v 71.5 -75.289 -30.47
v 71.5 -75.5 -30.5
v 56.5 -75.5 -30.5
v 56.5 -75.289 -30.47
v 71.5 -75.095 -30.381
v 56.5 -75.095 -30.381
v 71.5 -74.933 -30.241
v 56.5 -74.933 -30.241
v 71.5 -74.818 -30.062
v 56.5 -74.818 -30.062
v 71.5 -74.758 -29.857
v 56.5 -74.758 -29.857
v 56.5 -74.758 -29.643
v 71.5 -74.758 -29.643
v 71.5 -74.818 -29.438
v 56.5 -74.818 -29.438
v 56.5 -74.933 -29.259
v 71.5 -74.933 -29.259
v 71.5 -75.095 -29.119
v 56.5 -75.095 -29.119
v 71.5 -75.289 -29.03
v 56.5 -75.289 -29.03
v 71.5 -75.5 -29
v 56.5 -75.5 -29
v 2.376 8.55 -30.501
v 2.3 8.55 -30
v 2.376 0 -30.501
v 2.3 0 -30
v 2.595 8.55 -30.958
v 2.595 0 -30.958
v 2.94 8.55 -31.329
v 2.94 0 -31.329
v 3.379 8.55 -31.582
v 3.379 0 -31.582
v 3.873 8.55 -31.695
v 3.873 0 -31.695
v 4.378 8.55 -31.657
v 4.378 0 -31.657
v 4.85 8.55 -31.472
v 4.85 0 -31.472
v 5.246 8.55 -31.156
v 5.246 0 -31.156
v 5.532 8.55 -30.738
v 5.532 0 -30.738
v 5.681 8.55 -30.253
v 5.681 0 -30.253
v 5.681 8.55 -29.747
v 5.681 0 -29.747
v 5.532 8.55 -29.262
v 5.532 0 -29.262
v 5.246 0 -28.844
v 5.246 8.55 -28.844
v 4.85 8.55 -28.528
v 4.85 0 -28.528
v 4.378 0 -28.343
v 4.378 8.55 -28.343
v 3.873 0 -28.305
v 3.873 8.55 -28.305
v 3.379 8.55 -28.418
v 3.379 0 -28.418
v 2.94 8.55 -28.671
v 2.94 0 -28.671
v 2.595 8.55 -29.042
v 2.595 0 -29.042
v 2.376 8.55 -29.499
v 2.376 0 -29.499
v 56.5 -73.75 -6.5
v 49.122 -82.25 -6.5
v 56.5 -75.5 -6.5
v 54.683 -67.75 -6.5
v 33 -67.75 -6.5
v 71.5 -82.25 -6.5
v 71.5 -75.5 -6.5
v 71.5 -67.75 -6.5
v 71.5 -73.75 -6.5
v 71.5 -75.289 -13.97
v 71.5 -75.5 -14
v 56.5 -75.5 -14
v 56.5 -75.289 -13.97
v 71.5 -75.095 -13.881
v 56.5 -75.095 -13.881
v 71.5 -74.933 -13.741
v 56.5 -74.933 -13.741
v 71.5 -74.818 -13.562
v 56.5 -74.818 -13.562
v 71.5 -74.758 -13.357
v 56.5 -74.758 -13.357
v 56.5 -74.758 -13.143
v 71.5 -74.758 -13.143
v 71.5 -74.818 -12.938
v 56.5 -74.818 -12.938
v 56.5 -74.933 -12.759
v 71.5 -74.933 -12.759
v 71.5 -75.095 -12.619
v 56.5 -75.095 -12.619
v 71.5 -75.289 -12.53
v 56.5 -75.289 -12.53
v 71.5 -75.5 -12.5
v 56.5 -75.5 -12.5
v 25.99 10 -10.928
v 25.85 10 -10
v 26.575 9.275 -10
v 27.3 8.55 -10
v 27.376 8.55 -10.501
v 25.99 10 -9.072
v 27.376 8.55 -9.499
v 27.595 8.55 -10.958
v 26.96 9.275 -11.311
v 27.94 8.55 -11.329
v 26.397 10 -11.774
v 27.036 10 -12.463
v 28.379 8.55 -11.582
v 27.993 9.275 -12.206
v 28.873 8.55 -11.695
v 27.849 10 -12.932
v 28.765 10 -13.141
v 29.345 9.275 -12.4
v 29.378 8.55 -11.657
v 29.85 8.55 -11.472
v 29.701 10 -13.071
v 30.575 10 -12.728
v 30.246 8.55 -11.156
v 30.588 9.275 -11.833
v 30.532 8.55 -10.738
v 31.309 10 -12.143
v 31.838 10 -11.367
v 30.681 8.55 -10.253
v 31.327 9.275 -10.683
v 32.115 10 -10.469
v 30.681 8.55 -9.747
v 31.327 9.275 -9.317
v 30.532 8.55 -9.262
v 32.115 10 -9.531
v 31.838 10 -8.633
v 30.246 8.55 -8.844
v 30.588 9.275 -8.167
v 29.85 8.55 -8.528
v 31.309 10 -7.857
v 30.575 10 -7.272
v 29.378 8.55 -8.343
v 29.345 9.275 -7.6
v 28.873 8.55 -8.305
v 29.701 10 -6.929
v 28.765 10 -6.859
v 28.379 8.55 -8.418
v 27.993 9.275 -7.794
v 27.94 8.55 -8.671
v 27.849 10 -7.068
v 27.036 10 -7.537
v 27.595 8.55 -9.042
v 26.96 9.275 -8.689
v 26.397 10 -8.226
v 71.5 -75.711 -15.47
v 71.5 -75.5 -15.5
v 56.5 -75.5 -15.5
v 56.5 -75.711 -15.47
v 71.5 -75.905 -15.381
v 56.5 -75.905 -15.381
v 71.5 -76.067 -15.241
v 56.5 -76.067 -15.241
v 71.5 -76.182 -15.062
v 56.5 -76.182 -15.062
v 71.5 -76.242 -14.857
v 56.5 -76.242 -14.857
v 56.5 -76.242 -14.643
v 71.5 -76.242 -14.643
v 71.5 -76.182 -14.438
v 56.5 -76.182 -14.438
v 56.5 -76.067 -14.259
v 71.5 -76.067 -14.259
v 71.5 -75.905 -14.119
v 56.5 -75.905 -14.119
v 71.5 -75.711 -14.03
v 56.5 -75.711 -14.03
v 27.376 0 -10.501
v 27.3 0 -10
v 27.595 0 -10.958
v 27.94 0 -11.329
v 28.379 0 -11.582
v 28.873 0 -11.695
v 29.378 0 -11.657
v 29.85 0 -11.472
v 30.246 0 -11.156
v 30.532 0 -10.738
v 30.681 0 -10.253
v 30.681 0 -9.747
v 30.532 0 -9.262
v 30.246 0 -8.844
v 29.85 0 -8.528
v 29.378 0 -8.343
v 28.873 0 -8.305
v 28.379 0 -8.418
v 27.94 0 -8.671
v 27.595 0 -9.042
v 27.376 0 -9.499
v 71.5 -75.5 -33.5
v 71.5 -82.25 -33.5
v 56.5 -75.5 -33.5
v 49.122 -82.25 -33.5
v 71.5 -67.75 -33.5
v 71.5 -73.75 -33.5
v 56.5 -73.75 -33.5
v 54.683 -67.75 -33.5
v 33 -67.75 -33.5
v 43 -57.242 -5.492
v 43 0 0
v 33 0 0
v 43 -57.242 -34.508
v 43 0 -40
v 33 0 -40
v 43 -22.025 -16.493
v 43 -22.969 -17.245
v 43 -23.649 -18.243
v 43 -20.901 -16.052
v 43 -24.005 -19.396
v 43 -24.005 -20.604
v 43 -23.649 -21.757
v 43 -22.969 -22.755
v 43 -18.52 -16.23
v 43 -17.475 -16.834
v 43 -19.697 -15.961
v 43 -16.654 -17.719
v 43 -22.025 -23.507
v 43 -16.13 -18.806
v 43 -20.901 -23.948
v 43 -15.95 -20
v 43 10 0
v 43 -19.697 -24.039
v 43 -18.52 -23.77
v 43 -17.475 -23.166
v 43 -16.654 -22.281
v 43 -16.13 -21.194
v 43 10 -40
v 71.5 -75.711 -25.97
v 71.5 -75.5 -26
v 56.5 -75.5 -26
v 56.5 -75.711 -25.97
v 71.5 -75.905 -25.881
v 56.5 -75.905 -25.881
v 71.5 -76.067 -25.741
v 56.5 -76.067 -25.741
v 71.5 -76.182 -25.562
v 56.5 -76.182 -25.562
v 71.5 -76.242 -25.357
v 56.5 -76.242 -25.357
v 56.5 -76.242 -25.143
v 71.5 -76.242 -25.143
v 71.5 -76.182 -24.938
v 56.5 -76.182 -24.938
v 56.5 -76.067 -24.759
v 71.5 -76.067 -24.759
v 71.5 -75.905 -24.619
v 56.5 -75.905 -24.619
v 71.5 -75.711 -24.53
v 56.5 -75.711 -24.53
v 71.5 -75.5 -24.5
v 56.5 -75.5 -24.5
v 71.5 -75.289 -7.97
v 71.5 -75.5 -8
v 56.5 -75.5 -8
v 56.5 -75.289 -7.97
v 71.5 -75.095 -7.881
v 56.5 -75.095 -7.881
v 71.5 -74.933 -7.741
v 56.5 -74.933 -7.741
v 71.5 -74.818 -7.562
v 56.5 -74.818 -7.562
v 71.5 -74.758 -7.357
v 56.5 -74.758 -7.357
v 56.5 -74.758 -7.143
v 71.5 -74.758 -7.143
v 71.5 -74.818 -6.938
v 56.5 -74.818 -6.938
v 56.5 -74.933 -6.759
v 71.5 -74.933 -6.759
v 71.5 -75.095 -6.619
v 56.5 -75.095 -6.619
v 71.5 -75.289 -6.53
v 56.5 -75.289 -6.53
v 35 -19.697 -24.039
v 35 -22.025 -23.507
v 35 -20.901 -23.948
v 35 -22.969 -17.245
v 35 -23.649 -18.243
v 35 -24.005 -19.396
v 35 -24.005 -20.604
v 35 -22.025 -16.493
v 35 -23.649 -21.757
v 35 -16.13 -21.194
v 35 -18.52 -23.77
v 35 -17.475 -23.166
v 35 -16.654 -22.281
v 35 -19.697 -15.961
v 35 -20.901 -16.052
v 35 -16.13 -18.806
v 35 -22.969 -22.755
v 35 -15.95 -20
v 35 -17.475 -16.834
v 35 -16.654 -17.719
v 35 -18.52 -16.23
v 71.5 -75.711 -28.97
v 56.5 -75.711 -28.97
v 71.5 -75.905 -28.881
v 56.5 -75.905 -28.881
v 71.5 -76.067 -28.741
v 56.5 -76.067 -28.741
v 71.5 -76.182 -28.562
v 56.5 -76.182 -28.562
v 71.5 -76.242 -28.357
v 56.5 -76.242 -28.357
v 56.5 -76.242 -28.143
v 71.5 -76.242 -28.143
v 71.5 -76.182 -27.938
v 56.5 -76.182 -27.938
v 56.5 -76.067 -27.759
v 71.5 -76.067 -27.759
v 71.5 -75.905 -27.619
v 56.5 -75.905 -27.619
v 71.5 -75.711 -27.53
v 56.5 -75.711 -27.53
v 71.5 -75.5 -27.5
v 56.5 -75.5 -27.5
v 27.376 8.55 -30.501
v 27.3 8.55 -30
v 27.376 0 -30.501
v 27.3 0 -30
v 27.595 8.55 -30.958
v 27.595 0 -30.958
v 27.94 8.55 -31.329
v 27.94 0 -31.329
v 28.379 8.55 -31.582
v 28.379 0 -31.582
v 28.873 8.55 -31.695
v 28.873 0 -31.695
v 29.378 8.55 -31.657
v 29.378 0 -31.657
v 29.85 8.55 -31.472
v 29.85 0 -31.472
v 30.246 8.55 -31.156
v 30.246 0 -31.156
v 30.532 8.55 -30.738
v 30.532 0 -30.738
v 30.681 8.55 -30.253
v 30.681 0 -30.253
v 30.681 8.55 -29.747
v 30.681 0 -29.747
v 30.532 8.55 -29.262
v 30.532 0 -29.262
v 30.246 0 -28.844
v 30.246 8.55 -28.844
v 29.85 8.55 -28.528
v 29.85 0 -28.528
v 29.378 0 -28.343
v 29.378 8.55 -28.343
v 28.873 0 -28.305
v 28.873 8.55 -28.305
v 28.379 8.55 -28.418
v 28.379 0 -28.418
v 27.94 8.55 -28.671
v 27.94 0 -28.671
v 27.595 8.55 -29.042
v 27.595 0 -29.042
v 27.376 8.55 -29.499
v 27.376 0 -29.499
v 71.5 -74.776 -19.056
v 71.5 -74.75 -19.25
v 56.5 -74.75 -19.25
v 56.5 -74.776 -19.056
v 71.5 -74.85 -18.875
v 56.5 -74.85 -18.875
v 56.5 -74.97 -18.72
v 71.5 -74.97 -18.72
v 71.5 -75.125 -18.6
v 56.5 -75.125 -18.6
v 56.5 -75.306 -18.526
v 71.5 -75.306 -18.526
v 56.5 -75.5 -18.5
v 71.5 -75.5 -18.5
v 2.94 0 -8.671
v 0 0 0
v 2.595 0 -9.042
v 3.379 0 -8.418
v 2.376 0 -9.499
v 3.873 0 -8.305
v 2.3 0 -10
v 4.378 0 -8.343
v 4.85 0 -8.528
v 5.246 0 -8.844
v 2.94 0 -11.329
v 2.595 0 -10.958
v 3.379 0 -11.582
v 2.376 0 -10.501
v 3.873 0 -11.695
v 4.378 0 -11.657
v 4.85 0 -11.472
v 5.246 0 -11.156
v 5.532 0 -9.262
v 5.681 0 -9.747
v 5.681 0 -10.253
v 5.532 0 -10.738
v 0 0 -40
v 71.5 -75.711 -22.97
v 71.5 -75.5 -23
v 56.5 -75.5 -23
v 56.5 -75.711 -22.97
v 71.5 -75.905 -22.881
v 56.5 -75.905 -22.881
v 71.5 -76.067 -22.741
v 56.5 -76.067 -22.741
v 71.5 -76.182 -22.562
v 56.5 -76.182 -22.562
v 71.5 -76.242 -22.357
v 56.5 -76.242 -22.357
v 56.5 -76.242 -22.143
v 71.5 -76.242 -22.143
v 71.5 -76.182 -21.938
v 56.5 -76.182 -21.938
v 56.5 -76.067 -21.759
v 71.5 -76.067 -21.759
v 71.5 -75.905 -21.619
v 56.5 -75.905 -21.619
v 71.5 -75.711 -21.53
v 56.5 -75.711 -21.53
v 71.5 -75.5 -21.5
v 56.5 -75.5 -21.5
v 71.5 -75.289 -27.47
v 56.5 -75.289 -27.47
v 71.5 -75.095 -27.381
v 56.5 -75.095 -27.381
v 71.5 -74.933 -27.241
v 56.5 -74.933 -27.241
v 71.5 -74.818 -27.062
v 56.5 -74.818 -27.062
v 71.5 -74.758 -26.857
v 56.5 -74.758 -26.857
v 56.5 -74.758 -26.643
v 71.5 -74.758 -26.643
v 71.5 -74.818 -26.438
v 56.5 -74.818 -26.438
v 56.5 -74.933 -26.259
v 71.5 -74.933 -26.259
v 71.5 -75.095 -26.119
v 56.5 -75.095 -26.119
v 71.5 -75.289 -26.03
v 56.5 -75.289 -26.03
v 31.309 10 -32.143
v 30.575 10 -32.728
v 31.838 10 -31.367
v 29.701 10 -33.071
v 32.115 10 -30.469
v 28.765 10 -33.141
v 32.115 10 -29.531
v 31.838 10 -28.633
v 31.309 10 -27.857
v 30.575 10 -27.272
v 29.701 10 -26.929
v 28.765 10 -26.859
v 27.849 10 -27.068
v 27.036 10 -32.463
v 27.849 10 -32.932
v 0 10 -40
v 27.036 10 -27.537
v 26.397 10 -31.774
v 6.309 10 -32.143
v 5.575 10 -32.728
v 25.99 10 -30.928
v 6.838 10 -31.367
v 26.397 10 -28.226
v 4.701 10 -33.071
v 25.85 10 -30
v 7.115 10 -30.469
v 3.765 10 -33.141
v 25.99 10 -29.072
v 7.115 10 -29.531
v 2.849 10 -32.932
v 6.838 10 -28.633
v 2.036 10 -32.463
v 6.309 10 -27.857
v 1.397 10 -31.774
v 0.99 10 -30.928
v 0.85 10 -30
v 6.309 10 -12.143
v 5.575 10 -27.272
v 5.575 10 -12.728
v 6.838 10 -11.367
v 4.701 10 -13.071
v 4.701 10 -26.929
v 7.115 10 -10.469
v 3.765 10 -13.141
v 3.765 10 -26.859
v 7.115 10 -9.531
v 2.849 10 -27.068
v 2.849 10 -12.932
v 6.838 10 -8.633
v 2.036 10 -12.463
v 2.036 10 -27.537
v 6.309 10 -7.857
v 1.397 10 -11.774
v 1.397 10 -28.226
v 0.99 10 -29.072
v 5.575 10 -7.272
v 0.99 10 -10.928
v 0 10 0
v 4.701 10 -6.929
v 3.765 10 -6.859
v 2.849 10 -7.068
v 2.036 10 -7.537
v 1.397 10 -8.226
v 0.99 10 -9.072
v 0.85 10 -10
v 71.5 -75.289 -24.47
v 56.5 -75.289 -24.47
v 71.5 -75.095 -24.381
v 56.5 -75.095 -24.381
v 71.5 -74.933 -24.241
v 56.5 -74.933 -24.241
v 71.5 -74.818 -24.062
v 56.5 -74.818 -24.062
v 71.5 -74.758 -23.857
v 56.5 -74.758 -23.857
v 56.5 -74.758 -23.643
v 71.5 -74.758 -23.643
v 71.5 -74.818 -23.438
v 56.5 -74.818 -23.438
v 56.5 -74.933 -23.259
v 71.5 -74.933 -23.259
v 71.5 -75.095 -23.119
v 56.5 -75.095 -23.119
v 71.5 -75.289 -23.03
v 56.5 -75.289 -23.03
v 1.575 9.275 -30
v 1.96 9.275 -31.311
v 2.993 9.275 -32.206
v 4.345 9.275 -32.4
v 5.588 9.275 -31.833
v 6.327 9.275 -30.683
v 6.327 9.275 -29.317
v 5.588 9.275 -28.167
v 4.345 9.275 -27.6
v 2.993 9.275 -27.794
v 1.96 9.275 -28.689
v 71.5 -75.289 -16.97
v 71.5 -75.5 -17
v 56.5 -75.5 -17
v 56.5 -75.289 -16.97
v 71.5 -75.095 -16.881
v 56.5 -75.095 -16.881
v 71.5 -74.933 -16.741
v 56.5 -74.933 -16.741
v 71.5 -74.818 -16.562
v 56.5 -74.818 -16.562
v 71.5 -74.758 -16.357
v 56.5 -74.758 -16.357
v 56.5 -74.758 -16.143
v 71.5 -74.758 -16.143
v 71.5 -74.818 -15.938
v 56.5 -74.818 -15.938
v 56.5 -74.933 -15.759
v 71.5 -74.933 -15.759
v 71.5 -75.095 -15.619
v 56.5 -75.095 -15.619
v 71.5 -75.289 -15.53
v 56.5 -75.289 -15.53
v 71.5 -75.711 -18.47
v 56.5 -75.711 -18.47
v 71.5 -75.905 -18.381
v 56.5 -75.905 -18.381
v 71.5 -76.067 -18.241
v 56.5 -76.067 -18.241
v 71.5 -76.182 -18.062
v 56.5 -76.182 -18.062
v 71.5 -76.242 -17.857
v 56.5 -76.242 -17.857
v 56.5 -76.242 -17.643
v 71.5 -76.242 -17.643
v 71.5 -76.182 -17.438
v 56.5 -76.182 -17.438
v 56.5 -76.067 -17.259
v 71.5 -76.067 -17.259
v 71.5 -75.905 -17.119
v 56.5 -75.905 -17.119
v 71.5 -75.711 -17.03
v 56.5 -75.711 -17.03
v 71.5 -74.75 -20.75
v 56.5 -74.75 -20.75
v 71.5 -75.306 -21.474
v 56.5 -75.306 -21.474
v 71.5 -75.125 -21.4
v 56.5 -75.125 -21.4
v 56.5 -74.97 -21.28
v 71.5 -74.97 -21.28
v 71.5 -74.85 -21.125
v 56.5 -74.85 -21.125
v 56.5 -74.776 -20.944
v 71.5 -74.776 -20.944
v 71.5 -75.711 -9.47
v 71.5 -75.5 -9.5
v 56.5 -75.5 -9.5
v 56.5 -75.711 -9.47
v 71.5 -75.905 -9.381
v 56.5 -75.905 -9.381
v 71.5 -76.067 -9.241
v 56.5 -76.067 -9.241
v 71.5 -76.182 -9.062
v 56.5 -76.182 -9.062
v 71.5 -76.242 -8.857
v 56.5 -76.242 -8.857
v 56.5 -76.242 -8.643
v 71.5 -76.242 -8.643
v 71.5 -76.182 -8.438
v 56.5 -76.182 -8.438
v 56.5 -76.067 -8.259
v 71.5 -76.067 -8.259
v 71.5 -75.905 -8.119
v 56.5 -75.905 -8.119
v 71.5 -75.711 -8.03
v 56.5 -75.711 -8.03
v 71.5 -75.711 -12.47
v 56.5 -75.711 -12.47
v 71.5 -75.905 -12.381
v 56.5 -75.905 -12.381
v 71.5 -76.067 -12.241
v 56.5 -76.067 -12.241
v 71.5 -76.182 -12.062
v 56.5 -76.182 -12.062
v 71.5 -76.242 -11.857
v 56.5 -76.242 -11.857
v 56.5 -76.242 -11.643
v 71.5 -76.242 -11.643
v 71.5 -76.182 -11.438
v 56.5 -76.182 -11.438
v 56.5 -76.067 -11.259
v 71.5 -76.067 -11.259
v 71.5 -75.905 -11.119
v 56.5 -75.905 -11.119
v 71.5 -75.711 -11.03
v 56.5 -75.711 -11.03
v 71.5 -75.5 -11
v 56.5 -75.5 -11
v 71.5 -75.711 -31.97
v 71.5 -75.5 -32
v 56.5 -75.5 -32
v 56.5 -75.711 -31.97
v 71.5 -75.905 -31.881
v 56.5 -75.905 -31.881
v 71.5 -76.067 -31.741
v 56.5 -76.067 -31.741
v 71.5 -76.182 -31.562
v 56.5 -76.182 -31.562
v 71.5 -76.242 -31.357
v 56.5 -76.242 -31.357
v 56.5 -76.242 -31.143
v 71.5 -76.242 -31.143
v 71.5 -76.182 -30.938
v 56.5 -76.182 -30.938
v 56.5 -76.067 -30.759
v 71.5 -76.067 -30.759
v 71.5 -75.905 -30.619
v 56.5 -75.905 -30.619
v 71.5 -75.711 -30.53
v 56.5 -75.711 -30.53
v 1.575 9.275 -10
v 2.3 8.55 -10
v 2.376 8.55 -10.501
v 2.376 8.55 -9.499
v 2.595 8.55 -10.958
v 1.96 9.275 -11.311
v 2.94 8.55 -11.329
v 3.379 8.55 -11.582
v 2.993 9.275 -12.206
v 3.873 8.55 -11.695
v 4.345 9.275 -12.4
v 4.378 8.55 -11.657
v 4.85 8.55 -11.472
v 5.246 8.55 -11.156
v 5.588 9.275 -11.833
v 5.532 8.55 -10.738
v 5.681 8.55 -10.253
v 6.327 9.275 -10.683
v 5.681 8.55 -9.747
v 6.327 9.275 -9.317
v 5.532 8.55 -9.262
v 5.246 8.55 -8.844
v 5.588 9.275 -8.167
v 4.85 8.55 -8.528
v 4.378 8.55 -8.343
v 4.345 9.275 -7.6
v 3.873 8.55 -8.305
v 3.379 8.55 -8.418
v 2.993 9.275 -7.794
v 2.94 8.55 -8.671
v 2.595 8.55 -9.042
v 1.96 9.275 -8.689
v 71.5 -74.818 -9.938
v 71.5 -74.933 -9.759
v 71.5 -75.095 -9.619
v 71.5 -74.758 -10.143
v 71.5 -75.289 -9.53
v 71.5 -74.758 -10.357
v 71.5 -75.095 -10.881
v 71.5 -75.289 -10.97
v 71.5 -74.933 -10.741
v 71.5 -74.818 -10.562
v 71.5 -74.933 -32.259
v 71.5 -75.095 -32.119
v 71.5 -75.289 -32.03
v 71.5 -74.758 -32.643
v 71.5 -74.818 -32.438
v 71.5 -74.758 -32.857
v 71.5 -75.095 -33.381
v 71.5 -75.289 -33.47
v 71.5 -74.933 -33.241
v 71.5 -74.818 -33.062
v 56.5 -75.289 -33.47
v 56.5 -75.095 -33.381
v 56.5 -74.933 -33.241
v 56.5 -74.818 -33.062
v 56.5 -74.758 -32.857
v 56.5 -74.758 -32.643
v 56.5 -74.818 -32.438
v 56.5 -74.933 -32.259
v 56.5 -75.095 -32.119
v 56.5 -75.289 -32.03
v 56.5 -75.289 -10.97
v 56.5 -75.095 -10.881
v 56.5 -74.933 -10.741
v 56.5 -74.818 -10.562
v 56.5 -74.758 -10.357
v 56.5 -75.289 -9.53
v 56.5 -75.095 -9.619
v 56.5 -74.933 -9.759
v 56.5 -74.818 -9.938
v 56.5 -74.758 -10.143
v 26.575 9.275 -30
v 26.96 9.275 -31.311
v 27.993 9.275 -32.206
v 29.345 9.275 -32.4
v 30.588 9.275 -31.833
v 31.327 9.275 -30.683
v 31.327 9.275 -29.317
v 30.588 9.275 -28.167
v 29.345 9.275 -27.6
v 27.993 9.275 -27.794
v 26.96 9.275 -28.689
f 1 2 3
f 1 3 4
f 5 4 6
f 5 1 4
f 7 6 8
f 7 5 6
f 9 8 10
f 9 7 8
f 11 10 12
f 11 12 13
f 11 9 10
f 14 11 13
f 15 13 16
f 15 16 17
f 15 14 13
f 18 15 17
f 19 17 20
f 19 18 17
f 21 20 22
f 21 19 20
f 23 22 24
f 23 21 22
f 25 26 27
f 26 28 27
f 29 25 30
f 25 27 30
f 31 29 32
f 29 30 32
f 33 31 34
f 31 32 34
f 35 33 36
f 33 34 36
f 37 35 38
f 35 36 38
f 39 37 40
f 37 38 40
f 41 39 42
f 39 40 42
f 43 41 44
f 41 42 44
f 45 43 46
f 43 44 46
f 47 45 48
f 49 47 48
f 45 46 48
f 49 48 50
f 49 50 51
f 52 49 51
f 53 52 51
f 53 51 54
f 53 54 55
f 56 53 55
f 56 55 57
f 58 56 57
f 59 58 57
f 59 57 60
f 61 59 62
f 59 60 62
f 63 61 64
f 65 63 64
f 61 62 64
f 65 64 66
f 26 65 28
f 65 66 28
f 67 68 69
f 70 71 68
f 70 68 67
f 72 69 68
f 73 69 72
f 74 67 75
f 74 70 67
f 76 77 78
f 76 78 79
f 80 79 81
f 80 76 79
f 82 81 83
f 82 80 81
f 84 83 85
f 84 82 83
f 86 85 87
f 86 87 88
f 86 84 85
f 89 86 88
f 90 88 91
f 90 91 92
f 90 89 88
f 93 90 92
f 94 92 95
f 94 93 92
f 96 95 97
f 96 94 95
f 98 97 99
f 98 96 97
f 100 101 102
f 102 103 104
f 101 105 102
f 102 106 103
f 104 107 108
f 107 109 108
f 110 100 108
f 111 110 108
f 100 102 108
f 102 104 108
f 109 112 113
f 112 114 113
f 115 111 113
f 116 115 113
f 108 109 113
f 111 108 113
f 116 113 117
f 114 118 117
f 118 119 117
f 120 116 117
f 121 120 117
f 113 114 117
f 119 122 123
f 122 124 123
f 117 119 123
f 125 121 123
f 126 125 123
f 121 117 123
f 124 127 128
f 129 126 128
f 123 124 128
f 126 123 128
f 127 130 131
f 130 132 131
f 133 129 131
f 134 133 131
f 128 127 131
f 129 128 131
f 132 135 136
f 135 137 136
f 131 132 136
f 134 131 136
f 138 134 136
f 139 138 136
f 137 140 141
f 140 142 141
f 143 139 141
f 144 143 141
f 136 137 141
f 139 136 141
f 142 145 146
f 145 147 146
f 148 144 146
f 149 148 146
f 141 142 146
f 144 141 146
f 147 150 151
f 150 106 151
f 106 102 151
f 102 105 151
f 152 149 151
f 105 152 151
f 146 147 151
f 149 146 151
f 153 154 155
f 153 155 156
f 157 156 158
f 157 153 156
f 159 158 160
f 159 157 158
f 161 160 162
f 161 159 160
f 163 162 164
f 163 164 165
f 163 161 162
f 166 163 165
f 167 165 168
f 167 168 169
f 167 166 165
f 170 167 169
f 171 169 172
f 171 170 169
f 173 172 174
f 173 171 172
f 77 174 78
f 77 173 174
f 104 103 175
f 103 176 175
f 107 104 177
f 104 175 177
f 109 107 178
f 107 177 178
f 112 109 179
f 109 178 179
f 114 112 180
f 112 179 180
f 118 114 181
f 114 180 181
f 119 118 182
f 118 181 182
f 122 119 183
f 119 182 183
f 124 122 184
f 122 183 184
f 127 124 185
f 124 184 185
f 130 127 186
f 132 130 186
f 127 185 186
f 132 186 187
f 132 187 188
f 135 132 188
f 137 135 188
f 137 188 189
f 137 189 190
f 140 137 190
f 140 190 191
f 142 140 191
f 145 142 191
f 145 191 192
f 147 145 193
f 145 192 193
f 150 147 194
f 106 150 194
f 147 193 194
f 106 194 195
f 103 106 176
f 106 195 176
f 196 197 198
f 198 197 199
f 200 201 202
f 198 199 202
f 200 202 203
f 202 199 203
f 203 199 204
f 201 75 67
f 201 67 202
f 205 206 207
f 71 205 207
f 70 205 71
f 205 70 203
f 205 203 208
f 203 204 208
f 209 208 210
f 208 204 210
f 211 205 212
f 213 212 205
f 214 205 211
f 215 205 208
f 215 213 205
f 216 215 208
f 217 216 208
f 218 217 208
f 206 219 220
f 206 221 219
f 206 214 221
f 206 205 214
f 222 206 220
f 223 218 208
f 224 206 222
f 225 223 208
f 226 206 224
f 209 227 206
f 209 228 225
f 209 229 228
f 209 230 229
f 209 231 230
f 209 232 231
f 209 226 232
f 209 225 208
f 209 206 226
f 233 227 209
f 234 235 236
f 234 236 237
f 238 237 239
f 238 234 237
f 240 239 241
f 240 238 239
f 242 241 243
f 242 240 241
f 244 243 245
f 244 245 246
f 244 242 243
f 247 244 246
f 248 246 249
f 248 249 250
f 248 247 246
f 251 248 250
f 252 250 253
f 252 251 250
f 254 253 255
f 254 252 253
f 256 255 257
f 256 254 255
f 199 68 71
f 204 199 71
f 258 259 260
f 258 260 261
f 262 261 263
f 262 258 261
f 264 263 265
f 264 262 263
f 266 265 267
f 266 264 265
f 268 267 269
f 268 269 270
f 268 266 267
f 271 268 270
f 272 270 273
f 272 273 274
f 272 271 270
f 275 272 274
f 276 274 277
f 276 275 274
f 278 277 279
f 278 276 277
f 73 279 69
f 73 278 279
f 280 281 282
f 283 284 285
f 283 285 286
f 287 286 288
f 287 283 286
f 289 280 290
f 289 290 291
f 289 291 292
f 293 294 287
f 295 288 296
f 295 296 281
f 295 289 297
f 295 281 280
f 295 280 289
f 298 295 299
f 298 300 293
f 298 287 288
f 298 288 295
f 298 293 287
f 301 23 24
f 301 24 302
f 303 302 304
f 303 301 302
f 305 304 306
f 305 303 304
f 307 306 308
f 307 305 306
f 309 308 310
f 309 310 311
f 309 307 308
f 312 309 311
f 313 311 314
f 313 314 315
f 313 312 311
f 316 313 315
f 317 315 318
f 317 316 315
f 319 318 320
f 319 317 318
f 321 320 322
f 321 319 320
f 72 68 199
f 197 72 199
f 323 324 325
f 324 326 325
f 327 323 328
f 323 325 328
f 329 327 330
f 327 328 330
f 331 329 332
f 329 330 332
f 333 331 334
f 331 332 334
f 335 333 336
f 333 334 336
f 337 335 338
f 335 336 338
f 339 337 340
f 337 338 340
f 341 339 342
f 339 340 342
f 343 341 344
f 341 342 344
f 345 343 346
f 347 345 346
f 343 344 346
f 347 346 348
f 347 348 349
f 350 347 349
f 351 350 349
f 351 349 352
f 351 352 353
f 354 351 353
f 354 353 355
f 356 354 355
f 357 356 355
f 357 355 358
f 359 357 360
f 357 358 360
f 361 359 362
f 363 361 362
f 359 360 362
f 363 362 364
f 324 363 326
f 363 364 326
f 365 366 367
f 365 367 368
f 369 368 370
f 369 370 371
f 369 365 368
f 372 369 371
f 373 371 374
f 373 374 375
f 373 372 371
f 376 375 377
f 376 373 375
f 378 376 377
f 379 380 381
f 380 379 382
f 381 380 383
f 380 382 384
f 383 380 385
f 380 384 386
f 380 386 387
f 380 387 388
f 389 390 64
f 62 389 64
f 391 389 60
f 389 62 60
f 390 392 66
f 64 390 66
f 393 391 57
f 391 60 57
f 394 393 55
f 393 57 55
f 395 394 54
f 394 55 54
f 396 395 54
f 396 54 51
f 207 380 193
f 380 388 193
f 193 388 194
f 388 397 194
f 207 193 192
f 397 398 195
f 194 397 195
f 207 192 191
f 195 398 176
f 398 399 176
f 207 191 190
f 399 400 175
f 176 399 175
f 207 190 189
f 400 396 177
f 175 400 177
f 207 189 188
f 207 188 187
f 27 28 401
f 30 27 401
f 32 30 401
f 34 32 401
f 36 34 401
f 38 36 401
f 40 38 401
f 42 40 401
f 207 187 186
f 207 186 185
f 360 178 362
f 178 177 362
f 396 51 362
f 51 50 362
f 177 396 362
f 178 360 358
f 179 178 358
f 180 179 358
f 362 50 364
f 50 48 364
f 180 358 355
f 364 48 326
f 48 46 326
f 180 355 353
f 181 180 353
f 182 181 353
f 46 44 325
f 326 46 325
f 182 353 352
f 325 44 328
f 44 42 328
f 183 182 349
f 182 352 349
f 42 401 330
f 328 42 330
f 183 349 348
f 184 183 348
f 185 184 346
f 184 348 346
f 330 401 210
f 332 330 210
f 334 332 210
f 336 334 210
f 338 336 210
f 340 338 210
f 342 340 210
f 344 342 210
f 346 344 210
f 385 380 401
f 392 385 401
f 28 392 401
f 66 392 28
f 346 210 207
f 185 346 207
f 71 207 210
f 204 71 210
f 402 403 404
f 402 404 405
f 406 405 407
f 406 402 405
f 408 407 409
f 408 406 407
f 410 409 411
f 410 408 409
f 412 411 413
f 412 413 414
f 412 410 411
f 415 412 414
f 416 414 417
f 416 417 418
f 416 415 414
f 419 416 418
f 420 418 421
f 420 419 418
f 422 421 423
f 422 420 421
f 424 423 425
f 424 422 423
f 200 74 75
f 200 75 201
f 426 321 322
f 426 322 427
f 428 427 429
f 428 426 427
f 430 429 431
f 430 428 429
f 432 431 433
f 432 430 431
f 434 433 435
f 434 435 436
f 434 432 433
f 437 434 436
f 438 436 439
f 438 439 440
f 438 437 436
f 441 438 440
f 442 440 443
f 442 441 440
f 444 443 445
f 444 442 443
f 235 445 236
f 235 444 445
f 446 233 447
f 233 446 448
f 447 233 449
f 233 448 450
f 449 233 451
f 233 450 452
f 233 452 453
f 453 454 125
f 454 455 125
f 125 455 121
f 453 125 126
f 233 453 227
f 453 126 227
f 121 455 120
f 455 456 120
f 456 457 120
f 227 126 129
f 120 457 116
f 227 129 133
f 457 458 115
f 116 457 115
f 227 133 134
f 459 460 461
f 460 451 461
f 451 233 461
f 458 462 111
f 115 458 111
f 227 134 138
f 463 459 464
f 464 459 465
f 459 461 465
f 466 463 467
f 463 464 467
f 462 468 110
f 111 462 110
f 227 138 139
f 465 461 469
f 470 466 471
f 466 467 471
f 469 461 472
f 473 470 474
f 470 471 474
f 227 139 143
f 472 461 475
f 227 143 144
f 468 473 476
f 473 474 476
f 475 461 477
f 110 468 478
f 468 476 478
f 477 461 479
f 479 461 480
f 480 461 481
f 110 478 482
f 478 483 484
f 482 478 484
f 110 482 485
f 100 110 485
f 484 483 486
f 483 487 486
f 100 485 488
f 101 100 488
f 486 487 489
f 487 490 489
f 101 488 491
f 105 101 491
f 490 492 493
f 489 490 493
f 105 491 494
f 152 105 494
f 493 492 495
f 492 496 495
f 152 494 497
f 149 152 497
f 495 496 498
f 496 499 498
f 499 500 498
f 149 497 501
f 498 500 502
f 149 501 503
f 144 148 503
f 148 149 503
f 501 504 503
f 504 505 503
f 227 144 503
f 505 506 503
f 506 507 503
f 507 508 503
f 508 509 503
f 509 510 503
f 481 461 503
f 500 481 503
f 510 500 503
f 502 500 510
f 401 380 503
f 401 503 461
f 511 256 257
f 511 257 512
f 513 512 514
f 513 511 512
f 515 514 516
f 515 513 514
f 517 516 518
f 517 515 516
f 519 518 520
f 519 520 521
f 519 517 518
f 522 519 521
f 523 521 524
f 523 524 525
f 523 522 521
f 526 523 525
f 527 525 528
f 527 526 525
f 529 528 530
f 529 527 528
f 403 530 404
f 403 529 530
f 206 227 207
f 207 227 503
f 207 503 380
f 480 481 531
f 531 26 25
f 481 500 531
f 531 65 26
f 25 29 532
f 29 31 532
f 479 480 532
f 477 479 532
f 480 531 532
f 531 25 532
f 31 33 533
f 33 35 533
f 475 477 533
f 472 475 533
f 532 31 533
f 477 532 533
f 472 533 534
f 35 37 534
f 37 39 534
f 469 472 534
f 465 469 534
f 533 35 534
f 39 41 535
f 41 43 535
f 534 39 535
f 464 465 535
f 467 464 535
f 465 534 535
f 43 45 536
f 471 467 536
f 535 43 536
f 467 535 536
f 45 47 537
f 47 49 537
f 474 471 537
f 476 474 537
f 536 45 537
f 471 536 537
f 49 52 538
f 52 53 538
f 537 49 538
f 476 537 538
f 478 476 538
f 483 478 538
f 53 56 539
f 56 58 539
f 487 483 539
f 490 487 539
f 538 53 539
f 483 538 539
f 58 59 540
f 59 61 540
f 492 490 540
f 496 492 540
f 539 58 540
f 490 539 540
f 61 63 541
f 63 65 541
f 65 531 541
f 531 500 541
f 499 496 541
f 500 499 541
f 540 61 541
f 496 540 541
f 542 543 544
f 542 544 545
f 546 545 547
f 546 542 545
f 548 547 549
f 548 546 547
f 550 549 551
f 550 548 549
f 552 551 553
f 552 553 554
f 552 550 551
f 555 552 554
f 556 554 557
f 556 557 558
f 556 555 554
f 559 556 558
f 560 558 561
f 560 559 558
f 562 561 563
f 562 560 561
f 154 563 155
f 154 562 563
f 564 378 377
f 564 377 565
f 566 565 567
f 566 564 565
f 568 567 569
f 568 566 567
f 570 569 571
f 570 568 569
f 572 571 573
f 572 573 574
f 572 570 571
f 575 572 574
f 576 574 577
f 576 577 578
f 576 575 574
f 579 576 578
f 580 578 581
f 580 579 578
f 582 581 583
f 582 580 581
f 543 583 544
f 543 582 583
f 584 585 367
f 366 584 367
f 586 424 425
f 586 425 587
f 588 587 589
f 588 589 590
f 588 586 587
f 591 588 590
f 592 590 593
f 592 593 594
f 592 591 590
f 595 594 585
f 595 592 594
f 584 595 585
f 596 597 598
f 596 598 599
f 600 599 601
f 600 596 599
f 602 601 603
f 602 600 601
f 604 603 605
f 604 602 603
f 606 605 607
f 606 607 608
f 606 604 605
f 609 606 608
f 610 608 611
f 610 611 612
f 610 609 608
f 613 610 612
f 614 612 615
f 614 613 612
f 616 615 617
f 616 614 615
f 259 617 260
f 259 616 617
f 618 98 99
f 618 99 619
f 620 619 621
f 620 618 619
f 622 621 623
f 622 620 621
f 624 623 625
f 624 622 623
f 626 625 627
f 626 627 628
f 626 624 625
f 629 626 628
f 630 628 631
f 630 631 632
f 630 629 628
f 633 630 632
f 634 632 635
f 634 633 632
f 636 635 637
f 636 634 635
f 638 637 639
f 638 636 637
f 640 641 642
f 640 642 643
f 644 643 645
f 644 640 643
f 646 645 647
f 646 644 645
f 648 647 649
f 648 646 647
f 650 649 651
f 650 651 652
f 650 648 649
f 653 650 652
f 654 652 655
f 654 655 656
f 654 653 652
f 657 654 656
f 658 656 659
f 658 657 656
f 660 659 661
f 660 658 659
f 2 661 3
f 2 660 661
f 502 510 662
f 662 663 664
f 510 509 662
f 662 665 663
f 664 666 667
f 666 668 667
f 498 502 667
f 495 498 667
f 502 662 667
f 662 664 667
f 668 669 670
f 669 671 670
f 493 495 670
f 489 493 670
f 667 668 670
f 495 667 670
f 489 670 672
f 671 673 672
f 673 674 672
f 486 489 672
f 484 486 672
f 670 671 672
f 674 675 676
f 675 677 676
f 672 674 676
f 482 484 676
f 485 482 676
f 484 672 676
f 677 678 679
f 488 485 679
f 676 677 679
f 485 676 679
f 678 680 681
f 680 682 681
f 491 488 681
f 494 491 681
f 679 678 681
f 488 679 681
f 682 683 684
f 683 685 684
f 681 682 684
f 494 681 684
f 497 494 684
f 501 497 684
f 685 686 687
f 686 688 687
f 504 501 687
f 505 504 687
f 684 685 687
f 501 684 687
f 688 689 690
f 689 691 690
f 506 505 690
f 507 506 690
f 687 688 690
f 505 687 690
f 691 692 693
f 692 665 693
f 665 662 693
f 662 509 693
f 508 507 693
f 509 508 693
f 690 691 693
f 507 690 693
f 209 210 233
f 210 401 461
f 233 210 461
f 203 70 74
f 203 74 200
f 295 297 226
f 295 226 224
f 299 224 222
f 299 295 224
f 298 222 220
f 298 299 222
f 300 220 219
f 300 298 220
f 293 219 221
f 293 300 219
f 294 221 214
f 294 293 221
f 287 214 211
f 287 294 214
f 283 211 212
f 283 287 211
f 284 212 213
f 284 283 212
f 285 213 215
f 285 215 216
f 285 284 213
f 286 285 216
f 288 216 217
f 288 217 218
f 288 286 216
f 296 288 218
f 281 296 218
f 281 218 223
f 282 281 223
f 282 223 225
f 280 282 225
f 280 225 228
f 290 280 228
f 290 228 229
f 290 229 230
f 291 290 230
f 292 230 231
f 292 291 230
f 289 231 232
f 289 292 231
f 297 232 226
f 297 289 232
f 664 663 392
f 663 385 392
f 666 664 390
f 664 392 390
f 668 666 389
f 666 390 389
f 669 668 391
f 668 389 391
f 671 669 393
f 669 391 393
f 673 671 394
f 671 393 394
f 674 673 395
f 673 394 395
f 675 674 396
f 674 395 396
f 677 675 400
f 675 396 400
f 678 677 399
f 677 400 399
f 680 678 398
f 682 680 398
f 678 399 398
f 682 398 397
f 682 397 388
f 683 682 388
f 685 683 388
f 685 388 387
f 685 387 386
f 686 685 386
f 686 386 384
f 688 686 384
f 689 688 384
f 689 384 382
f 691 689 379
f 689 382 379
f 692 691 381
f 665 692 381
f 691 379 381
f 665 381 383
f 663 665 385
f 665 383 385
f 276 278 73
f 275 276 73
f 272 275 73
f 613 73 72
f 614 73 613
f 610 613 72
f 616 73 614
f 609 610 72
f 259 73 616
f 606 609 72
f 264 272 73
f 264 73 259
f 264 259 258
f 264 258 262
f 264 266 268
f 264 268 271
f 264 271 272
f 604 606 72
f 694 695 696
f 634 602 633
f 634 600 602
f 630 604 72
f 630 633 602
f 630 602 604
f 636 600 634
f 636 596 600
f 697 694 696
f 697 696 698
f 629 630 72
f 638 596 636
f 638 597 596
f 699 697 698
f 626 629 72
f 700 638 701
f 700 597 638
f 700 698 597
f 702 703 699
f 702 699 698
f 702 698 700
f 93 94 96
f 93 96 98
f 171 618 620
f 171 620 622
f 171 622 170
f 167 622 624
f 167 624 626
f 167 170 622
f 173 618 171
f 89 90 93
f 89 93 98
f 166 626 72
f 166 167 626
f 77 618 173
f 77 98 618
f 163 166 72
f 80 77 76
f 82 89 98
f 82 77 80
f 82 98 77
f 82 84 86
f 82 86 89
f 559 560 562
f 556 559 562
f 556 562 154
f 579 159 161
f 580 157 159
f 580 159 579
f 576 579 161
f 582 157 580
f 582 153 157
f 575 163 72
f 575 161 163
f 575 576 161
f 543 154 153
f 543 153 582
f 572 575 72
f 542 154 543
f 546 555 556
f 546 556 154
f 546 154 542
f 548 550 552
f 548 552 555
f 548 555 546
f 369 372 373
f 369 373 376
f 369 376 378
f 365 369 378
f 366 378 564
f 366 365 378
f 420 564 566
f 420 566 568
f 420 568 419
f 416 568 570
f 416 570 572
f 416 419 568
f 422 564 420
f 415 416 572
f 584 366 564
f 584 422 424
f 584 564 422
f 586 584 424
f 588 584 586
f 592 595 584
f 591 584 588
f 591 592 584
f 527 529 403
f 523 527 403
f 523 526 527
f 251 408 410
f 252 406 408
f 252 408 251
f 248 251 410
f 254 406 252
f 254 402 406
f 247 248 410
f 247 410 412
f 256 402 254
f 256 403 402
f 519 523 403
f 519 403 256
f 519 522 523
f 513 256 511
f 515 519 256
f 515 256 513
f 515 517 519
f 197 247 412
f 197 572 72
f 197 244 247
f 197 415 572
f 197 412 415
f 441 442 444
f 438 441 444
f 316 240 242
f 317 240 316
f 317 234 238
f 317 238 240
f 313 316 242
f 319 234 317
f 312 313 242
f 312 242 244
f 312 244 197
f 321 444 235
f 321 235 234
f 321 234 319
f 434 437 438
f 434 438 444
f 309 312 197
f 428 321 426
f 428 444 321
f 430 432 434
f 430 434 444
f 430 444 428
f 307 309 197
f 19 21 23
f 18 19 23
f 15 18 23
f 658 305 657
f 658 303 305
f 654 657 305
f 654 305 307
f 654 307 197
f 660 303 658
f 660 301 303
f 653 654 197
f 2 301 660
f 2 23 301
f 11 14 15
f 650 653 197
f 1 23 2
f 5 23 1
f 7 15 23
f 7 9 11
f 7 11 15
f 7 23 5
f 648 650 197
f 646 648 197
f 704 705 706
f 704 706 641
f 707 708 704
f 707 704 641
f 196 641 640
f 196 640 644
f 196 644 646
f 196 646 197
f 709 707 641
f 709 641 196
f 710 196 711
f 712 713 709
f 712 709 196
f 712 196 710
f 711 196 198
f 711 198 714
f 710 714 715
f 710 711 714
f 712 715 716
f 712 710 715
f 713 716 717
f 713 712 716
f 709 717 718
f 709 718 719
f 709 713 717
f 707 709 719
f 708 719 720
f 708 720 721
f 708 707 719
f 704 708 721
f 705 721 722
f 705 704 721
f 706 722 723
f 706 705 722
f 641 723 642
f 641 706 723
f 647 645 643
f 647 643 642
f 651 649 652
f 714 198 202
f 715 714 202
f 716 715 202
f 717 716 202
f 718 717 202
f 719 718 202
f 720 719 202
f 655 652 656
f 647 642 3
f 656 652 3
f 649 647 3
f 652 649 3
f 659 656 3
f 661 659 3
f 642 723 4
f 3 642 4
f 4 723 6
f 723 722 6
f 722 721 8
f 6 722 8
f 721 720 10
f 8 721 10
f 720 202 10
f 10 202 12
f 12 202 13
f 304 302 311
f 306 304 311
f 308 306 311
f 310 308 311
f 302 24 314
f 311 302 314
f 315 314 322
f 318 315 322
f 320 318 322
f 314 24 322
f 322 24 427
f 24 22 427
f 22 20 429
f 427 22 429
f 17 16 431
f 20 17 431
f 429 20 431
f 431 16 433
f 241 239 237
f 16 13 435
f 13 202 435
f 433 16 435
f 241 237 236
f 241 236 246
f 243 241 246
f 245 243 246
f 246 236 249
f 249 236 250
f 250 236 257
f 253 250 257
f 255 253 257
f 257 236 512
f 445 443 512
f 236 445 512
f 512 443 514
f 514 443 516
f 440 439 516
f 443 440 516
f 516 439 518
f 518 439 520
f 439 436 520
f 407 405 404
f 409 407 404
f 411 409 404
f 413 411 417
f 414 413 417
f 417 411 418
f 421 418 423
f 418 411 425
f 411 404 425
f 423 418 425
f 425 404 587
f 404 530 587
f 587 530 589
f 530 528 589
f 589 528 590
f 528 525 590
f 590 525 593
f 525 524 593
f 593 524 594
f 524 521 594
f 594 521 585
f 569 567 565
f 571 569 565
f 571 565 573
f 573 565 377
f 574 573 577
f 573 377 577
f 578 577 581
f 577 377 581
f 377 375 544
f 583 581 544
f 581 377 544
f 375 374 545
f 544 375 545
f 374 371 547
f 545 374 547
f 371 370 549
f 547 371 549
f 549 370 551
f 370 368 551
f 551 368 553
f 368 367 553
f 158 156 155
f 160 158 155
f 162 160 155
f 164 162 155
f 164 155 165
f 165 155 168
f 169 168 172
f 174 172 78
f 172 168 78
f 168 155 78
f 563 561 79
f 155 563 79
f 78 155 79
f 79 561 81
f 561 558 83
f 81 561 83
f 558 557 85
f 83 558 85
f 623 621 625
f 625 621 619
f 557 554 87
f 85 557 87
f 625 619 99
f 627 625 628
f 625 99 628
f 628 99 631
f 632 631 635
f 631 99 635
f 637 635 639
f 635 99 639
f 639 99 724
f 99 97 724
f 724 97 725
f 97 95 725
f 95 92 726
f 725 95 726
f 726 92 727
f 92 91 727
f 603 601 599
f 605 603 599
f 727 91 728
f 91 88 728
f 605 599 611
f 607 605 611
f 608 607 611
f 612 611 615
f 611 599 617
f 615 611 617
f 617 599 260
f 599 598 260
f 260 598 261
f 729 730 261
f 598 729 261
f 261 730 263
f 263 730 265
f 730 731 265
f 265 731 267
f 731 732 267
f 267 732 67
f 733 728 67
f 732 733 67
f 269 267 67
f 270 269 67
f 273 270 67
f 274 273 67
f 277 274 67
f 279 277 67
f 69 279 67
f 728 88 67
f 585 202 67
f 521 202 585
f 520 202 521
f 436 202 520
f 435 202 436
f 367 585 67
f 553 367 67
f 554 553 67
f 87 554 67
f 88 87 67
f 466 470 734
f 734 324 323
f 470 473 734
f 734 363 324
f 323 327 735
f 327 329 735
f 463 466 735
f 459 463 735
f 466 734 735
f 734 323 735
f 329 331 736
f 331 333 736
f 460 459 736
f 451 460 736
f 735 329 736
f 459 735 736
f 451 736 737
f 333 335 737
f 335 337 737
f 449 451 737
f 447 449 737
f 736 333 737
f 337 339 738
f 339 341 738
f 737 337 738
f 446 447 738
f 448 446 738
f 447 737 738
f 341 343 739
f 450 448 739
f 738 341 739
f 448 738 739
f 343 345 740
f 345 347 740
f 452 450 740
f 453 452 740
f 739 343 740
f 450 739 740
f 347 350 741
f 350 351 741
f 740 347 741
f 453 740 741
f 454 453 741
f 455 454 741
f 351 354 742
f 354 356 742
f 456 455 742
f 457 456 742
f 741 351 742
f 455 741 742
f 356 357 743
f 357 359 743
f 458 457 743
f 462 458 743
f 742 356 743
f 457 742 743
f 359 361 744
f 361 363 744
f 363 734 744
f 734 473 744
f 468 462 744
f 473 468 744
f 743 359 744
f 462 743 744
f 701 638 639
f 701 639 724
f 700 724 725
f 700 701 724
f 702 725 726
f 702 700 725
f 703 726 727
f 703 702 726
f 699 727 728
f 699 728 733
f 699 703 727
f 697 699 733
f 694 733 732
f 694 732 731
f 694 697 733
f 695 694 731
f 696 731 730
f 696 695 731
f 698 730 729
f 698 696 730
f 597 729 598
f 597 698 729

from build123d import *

# Parameters (mm, degrees)
SKETCH_1_W                   = 33
SKETCH_1_H                   = 40
EXTRUDE_1_DEPTH              = 10
EXTRUDE_2_DEPTH              = 10
SKETCH_3_W                   = 27
SKETCH_3_H                   = 14.5
EXTRUDE_3_DEPTH              = 28.5
CUT_EXTRUDE_1_DEPTH          = 15
CUT_EXTRUDE_2_REACH          = 116.016
EXTRUDE_4_REACH              = 116.016
EXTRUDE_5_REACH              = 116.016
HOLE_WIZARD_M3_1_D           = 3.4
HOLE_WIZARD_M3_1_CSINK_D     = 6.3
HOLE_WIZARD_M3_1_CSINK_ANGLE = 90
OTHER_START                  = 35
OTHER_1_OUTLINE_R            = 4.05
OTHER_1_DEPTH                = 8


# Read off the part's stored shape, not the designer's step: 高级异型孔1
with BuildPart() as part:
    # 草图1 → 凸台-拉伸1 (new body)
    with BuildSketch(Plane(origin=(0, 0, 0), x_dir=(1, 0, 0), z_dir=(0, 1, 0))):
        with Locations((16.5, 20)):
            Rectangle(SKETCH_1_W, SKETCH_1_H)
    extrude(amount=EXTRUDE_1_DEPTH)

    # 草图2 → 凸台-拉伸2 (add)
    with BuildSketch(Plane(origin=(33, 0, 0), x_dir=(0, 0, -1), z_dir=(1, 0, 0))):
        Polygon((0, 0), (6.5, -67.75), (6.5, -82.25), (33.5, -82.25), (33.5, -67.75), (40, 0), (40, 10), (0, 10), align=None)
    extrude(amount=EXTRUDE_2_DEPTH)

    # 草图3 → 凸台-拉伸3 (add)
    with BuildSketch(Plane(origin=(43, 0, 0), x_dir=(0, 0, -1), z_dir=(1, 0, 0))):
        with Locations((20, -75)):
            Rectangle(SKETCH_3_W, SKETCH_3_H)
    extrude(amount=EXTRUDE_3_DEPTH)

    # 草图4 → 切除-拉伸1 (cut)
    with BuildSketch(Plane.ZY.offset(-71.5)):
        with BuildLine():
            Line((-6.5, -75.5), (-6.5, -73.75))
            Line((-6.5, -73.75), (-33.5, -73.75))
            Line((-33.5, -73.75), (-33.5, -75.5))
            ThreePointArc((-33.5, -75.5), (-32.75, -74.75), (-32, -75.5))
            ThreePointArc((-32, -75.5), (-31.25, -76.25), (-30.5, -75.5))
            ThreePointArc((-30.5, -75.5), (-29.75, -74.75), (-29, -75.5))
            ThreePointArc((-29, -75.5), (-28.25, -76.25), (-27.5, -75.5))
            ThreePointArc((-27.5, -75.5), (-26.75, -74.75), (-26, -75.5))
            ThreePointArc((-26, -75.5), (-25.25, -76.25), (-24.5, -75.5))
            ThreePointArc((-24.5, -75.5), (-23.75, -74.75), (-23, -75.5))
            ThreePointArc((-23, -75.5), (-22.25, -76.25), (-21.5, -75.5))
            ThreePointArc((-21.5, -75.5), (-21.280330086, -74.969669914), (-20.75, -74.75))
            Line((-20.75, -74.75), (-19.25, -74.75))
            ThreePointArc((-19.25, -74.75), (-18.719669914, -74.969669914), (-18.5, -75.5))
            ThreePointArc((-18.5, -75.5), (-17.75, -76.25), (-17, -75.5))
            ThreePointArc((-17, -75.5), (-16.25, -74.75), (-15.5, -75.5))
            ThreePointArc((-15.5, -75.5), (-14.75, -76.25), (-14, -75.5))
            ThreePointArc((-14, -75.5), (-13.25, -74.75), (-12.5, -75.5))
            ThreePointArc((-12.5, -75.5), (-11.75, -76.25), (-11, -75.5))
            ThreePointArc((-11, -75.5), (-10.25, -74.75), (-9.5, -75.5))
            ThreePointArc((-9.5, -75.5), (-8.75, -76.25), (-8, -75.5))
            ThreePointArc((-8, -75.5), (-7.25, -74.75), (-6.5, -75.5))
        make_face()
    extrude(amount=CUT_EXTRUDE_1_DEPTH, mode=Mode.SUBTRACT)

    # 草图5 → 切除-拉伸2 (cut, up to next)
    with BuildSketch(Plane.XY.offset(-6.5), mode=Mode.PRIVATE) as cut_extrude_2_sk1:
        Polygon((33, -82.25), (49.121822718, -82.25), (33, -67.75), align=None)
    cut_extrude_2_tool1 = extrude(cut_extrude_2_sk1.sketch, amount=-CUT_EXTRUDE_2_REACH, mode=Mode.PRIVATE) & part.part
    add(cut_extrude_2_tool1.solids().sort_by_distance((38.373941, -77.416667, -6.5))[0], mode=Mode.SUBTRACT)

    # 凸台-拉伸4: up to this plane
    extrude_4_end = Plane(origin=(43, -67.75, -33.5), z_dir=(0, 0.09550243214662471, 0.9954291966052028))
    # 草图6 → 凸台-拉伸4 (add, up to the surface)
    with BuildSketch(Plane.XY.offset(-6.5), mode=Mode.PRIVATE) as extrude_4_sk1:
        Polygon((43, -57.242064668), (43, -67.75), (54.683246246, -67.75), align=None)
    extrude_4_tool1 = split(extrude(extrude_4_sk1.sketch, amount=-EXTRUDE_4_REACH, mode=Mode.PRIVATE), bisect_by=extrude_4_end, keep=Keep.BOTH, mode=Mode.PRIVATE)
    add(extrude_4_tool1.solids().sort_by_distance((46.894415, -64.247355, -6.5))[0])

    # 凸台-拉伸5: up to this face of the body (flat: up to its plane)
    extrude_5_end = Plane(part.part.faces().sort_by_distance((38, -33.875, -3.25))[0])
    # 草图6<2> → 凸台-拉伸5 (add, up to the picked face)
    with BuildSketch(Plane.XY.offset(-6.5), mode=Mode.PRIVATE) as extrude_5_sk1:
        Polygon((43, -57.242064668), (43, -67.75), (54.683246246, -67.75), align=None)
    extrude_5_tool1 = split(extrude(extrude_5_sk1.sketch, amount=EXTRUDE_5_REACH, mode=Mode.PRIVATE), bisect_by=extrude_5_end, keep=Keep.BOTH, mode=Mode.PRIVATE)
    add(extrude_5_tool1.solids().sort_by(Axis((46.894415, -64.247355, -6.5), (0, 0, 1)))[0])

    # M3 平头机械螺钉的锥形沉头孔1 (through all)
    with Locations(Plane(origin=(0, 10, 0), x_dir=(1, 0, 0), z_dir=(0, 1, 0))):
        with Locations((29, 30), (4, 30), (4, 10), (29, 10)):
            CounterSinkHole(HOLE_WIZARD_M3_1_D / 2, HOLE_WIZARD_M3_1_CSINK_D / 2, counter_sink_angle=HOLE_WIZARD_M3_1_CSINK_ANGLE)

    # 高级异型孔1 outline → 高级异型孔1 (cut)
    with BuildSketch(Plane.YZ.offset(OTHER_START)):
        with Locations((-20, -20)):
            Circle(OTHER_1_OUTLINE_R)
    extrude(amount=OTHER_1_DEPTH, mode=Mode.SUBTRACT)


solid = part.part
